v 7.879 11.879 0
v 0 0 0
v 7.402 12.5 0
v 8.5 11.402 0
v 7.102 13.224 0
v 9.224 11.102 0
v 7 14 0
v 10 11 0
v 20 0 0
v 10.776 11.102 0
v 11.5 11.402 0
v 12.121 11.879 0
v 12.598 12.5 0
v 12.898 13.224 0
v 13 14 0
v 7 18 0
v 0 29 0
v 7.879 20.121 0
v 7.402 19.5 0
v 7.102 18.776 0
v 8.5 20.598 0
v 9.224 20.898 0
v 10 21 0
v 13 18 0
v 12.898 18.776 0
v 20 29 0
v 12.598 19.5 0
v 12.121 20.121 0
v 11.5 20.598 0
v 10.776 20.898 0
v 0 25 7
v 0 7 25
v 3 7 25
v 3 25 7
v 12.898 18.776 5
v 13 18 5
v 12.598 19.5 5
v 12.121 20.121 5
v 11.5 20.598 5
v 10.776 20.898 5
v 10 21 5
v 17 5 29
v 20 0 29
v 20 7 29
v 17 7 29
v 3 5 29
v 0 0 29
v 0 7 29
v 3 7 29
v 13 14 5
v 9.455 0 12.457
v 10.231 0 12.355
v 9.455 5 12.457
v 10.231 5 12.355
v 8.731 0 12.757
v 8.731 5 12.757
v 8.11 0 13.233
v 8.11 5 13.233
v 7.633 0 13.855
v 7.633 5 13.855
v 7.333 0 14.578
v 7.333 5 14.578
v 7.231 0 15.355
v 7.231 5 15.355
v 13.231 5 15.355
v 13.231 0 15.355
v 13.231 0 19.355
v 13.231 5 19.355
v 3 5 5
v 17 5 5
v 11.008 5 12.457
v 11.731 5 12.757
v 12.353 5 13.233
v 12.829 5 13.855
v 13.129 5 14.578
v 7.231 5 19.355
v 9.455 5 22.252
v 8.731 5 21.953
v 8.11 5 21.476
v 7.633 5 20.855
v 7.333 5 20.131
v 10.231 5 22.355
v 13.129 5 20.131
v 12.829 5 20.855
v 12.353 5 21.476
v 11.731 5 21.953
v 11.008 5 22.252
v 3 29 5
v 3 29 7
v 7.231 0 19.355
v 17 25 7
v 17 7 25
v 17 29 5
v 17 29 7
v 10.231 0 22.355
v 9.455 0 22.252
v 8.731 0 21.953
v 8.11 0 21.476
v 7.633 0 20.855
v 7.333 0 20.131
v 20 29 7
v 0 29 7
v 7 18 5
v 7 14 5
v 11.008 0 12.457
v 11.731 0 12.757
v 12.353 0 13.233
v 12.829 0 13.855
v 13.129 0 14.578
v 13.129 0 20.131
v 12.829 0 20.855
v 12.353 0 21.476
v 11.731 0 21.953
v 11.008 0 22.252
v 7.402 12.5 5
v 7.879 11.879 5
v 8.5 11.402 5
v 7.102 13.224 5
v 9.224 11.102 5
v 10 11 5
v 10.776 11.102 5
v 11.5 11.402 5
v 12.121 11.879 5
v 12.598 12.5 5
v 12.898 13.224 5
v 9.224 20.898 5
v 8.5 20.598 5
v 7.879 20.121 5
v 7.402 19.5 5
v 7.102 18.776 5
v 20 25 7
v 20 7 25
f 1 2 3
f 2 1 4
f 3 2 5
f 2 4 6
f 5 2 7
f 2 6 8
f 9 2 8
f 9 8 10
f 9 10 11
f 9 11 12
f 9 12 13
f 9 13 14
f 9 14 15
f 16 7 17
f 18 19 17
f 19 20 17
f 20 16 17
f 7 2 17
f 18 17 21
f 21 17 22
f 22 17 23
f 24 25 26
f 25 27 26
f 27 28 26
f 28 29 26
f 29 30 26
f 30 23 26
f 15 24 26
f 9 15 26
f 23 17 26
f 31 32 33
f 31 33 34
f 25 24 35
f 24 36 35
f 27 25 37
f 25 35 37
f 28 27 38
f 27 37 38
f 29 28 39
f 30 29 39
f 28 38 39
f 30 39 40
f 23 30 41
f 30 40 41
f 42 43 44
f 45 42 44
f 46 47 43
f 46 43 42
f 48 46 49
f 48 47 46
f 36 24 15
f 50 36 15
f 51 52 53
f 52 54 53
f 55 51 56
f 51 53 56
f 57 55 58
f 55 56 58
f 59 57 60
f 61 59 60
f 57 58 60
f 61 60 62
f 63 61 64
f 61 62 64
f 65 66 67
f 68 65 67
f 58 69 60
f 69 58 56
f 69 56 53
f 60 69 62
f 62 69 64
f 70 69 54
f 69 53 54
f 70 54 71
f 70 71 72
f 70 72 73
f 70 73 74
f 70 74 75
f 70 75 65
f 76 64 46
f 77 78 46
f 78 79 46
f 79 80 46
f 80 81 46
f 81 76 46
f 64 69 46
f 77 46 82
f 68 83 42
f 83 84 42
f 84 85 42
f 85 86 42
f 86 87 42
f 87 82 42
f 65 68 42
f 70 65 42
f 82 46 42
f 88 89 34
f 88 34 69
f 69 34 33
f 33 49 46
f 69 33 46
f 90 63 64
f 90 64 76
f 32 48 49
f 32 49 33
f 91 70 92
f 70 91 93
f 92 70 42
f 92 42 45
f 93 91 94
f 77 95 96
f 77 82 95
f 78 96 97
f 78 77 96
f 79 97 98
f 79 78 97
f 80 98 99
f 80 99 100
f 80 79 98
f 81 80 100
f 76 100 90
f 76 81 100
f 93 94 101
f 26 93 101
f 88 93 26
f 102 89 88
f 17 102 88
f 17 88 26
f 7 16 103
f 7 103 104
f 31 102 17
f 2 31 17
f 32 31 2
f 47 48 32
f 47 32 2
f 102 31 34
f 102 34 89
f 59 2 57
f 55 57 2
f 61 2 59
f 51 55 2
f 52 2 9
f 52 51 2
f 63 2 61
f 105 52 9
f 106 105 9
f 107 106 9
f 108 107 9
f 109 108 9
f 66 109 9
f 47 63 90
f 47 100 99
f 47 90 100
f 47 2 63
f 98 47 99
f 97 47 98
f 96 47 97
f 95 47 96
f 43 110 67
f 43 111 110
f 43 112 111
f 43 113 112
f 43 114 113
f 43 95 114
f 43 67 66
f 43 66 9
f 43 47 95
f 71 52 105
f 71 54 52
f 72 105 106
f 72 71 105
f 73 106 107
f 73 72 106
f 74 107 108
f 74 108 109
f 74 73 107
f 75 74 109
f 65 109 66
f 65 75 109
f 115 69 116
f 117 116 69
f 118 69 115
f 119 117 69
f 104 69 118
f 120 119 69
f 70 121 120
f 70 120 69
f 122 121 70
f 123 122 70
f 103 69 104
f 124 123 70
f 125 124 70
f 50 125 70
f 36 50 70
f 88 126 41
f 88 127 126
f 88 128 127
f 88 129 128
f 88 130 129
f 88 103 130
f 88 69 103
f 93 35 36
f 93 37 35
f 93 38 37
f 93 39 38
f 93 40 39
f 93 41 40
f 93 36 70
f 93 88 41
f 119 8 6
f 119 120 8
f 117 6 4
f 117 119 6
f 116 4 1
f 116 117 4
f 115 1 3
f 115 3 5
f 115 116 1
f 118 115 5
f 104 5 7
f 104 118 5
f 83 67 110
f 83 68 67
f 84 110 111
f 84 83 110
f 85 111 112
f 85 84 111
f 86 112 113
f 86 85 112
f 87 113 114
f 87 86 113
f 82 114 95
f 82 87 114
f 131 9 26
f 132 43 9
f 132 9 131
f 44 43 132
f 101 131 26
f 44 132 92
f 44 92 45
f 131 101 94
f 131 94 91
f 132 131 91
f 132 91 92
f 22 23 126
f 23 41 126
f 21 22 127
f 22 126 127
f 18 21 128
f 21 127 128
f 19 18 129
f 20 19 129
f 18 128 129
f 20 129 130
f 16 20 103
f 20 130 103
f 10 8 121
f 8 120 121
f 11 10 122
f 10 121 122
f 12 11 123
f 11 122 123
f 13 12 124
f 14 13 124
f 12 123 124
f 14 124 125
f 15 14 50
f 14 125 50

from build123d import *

# Parameters (mm, degrees)
F0_W      = 20
F0_H      = 29
F1_DEPTH  = 5
F3_W      = 20
F3_H      = 24
F4_DEPTH  = 5
F6_DEPTH  = 3
F8_DEPTH  = 3
F9_W      = 6
F9_H      = 10
F10_DEPTH = 29.001
F11_W     = 6
F11_H     = 10
F12_DEPTH = 29.001
F13_R     = 2.99999


# Not quite as in the source:
# - a fillet or chamfer is up to 0.001 mm smaller than in the source, because OpenCascade refuses the exact size


with BuildPart() as f1:
    # F0 (on Top) → F1 (new body)
    with BuildSketch(Plane.XY):
        with Locations((10, 14.5)):
            Rectangle(F0_W, F0_H)
    extrude(amount=F1_DEPTH)

    # F3 (on face) → F4 (join)
    with BuildSketch(Plane.XZ):
        with Locations((10, 17)):
            Rectangle(F3_W, F3_H)
    extrude(amount=-F4_DEPTH)

    # F5 (on face) → F6 (join)
    with BuildSketch(Plane.YZ.offset(20)):
        Polygon((7, 29), (5, 29), (5, 5), (29, 5), (29, 7), (25, 7), (7, 25), align=None)
    extrude(amount=-F6_DEPTH)

    # F7 (on face) → F8 (join)
    with BuildSketch(Plane(origin=(0, 0, 0), x_dir=(0, -1, 0), z_dir=(-1, 0, 0))):
        Polygon((-29, 7), (-29, 5), (-5, 5), (-5, 29), (-7, 29), (-7, 25), (-25, 7), align=None)
    extrude(amount=-F8_DEPTH)

    # F9 (on face) → F10 (cut, through all)
    with BuildSketch(Plane(origin=(0, 0, 0), x_dir=(1, 0, 0), z_dir=(0, 0, -1))):
        with Locations((10, -16)):
            Rectangle(F9_W, F9_H)
    extrude(amount=-F10_DEPTH, mode=Mode.SUBTRACT)

    # F11 (on face) → F12 (cut, through all)
    with BuildSketch(Plane.XZ):
        with Locations((10.2312741801, 17.3546597362)):
            Rectangle(F11_W, F11_H)
    extrude(amount=-F12_DEPTH, mode=Mode.SUBTRACT)

    # F13 (radius 3 in the source; OpenCascade refuses exactly that, so slightly less here)
    f13_edges = [f1.edges().sort_by_distance(p)[0] for p in [
        (7, 11, 2.5),
        (13, 11, 2.5),
        (7, 21, 2.5),
        (13, 21, 2.5),
        (7.231274, 2.5, 12.35466),
        (13.231274, 2.5, 12.35466),
        (7.231274, 2.5, 22.35466),
        (13.231274, 2.5, 22.35466),
    ]]
    fillet(f13_edges, radius=F13_R)


solid = f1.part
